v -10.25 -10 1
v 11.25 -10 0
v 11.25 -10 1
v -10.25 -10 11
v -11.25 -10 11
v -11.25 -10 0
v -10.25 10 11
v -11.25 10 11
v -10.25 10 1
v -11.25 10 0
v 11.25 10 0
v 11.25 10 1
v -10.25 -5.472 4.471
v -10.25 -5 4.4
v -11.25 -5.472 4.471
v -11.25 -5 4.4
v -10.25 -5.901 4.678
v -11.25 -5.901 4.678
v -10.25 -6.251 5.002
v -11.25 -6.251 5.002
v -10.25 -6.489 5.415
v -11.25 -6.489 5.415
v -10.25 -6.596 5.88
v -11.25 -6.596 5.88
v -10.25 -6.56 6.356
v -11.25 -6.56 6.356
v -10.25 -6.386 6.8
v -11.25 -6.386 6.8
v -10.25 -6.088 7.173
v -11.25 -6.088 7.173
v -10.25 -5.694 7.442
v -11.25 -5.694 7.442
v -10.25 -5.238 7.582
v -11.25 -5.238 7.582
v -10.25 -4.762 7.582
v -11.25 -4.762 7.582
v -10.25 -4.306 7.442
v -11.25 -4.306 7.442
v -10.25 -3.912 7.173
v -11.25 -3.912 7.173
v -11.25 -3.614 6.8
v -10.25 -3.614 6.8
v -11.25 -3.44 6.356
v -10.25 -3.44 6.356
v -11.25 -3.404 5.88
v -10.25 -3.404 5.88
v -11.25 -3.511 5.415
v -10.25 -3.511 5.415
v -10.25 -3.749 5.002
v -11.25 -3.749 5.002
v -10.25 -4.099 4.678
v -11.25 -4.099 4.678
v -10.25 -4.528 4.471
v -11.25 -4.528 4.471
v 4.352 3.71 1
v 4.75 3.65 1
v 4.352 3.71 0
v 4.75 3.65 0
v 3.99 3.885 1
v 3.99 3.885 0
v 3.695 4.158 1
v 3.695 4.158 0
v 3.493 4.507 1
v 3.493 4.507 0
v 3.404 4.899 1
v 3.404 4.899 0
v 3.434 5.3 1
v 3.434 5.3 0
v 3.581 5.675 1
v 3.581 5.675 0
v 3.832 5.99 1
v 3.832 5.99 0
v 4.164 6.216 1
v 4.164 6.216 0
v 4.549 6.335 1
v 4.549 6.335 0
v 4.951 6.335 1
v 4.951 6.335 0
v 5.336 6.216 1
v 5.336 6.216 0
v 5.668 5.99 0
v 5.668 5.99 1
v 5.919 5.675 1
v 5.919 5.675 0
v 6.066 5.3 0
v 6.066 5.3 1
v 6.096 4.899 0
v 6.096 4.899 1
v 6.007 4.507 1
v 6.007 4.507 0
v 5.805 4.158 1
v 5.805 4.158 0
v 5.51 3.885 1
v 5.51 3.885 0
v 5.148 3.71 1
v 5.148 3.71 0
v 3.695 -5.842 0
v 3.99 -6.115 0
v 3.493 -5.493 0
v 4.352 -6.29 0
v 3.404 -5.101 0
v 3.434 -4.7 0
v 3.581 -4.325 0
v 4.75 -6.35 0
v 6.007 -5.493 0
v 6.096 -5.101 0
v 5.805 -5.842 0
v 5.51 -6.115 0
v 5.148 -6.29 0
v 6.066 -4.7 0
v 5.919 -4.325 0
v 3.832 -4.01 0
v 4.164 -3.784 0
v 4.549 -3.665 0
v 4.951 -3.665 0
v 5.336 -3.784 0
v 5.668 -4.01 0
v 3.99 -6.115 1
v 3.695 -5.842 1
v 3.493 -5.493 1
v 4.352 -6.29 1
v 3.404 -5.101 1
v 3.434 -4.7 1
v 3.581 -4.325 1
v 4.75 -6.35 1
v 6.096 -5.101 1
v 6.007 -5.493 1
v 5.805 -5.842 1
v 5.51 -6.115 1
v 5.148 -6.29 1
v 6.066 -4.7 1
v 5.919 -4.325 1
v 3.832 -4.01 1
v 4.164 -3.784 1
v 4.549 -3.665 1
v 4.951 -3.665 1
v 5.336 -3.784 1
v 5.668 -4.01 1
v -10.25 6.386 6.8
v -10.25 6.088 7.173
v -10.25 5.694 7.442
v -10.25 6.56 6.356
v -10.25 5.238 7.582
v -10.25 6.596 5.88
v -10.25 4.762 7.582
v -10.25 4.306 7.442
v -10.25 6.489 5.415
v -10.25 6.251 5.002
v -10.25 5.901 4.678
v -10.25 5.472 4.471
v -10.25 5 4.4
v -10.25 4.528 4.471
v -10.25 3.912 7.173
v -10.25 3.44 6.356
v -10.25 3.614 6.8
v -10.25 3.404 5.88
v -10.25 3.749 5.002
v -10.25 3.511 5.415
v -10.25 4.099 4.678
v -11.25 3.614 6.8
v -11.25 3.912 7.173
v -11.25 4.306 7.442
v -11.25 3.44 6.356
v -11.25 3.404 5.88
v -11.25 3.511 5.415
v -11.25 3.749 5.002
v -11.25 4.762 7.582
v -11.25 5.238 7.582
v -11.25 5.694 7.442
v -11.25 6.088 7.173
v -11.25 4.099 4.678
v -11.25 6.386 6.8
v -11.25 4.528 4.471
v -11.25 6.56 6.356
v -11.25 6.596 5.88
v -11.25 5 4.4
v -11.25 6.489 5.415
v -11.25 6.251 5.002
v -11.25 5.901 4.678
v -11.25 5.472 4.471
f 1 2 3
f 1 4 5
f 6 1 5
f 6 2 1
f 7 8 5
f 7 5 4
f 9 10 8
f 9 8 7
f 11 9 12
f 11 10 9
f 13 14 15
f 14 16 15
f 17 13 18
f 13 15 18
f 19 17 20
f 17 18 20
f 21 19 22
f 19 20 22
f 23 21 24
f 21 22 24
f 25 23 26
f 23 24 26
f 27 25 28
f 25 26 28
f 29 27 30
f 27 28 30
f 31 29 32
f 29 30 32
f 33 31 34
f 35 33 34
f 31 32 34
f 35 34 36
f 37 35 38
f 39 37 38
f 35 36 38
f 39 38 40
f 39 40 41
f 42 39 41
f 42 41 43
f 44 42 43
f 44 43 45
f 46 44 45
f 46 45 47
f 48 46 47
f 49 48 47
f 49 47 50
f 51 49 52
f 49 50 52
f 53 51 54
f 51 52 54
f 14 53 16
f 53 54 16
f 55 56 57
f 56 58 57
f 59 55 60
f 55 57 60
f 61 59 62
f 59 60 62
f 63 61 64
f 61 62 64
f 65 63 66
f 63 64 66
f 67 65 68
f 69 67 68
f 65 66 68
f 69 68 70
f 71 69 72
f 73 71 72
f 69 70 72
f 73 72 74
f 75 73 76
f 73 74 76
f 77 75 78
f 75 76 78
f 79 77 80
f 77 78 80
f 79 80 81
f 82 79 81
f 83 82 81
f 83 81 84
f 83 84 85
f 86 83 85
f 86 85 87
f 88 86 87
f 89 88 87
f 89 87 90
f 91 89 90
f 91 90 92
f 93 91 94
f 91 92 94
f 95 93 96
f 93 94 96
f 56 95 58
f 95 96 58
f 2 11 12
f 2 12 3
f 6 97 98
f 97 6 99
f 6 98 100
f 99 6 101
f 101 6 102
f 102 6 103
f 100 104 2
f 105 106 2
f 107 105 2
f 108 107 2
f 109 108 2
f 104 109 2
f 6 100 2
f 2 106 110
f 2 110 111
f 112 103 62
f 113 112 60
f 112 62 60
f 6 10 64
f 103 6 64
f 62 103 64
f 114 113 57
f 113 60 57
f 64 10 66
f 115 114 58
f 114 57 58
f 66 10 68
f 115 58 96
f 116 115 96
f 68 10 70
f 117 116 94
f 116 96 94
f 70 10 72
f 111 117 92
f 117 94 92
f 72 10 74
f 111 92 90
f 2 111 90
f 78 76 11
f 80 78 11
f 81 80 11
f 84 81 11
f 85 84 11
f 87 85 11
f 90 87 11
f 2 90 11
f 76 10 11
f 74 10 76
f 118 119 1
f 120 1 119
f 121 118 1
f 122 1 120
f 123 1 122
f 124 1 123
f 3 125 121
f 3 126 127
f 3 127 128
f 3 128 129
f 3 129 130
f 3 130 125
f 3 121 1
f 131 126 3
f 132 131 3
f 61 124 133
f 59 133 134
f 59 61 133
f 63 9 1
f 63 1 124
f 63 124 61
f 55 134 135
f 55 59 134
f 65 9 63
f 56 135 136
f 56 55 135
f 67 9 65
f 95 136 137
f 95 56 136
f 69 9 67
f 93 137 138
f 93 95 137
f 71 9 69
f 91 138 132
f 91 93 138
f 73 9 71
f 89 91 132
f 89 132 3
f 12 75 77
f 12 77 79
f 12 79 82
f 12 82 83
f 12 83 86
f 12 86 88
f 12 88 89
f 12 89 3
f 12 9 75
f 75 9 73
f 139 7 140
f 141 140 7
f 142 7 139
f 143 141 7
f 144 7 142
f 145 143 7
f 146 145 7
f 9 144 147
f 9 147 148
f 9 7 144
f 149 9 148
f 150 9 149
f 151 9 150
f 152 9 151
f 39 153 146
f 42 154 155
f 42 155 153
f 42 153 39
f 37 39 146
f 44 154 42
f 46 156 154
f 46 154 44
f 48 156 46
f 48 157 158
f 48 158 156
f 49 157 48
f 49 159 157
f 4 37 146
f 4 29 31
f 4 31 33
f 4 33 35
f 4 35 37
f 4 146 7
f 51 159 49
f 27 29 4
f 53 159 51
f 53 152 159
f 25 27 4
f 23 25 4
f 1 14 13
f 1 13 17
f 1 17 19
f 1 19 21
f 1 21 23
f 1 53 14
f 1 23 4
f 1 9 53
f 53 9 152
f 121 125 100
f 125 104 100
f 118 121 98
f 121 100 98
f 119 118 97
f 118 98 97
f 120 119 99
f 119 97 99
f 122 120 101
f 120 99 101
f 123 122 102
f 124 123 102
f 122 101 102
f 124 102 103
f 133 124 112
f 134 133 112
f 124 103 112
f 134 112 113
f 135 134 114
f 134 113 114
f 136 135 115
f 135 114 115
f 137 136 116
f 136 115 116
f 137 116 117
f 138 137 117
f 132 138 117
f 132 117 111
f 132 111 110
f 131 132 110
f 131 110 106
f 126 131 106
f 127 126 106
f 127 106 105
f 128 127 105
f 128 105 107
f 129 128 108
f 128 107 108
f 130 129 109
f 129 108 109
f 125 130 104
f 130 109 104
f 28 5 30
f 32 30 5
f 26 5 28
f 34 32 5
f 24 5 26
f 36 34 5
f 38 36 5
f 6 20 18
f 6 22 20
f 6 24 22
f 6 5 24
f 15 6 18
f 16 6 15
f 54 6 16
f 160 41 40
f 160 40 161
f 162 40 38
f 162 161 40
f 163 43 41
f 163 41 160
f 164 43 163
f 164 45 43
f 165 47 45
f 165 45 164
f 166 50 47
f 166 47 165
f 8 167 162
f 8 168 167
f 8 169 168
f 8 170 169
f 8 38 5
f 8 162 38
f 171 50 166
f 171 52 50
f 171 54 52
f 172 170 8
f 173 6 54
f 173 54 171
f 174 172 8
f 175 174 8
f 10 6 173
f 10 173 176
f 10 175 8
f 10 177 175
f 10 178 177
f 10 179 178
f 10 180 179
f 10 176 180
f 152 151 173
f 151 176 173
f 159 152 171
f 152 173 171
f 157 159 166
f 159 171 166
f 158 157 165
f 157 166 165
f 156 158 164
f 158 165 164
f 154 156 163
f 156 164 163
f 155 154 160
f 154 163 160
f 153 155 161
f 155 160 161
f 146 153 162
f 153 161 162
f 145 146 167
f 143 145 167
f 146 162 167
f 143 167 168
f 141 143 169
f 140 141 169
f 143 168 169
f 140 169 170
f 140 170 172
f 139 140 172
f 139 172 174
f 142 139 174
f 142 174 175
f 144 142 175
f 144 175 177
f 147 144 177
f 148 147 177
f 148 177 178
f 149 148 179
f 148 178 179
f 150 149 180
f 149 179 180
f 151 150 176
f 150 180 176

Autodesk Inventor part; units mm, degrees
ref_plane "YZ Plane" through (0, 0, 0) normal (1, 0, 0) x (0, 1, 0)
ref_plane "XZ Plane" through (0, 0, 0) normal (0, 1, 0) x (-1, 0, 0)
ref_plane "XY Plane" through (0, 0, 0) normal (0, 0, 1) x (1, 0, 0)
sketch "スケッチ3" plane through (0, 0, 0) normal (0, 0, 1) x (1, 0, 0)
  line L0 (-11.25, 10) -> (11.25, 10)
  line L1 (11.25, 10) -> (11.25, -10)
  line L2 (11.25, -10) -> (-11.25, -10)
  line L3 (-11.25, -10) -> (-11.25, 10)
  line L4 (-11.25, 10) -> (11.25, -10) construction
  line L5 (11.25, 10) -> (-11.25, -10) construction
  point P0 (0, 0)
  dimension "d15" = 22.5
  dimension "d16" = 20
extrude "押し出し2" add sketch "スケッチ3" along normal blind 1
sketch "スケッチ4" plane through (0, 0, 1) normal (0, 0, 1) x (1, 0, 0)
  line L0 (-11.25, 10) -> (-11.25, -10) projected
  line L1 (11.25, 10) -> (-11.25, 10) projected
  line L2 (-11.25, -10) -> (11.25, -10) projected
  point P0 (0, 0)
  point P1 (4.75, 5)
  point P2 (4.75, -5)
  dimension "d19" = 16
  dimension "d20" = 5
  dimension "d21" = 5
hole "穴2" at (4.75, 5, 1) at (4.75, -5, 1) direction (0, 0, -1) diameter 2.7 end through all
sketch "スケッチ5" plane through (0, 0, 1) normal (0, 0, 1) x (1, 0, 0)
  line L0 (11.25, -10) -> (-11.25, -10) projected
  line L1 (-11.25, 10) -> (-10.25, 10)
  line L2 (-10.25, 10) -> (-10.25, -10)
  line L3 (-10.25, -10) -> (-11.25, -10)
  line L4 (-11.25, -10) -> (-11.25, 10)
  point P0 (0, 0)
  dimension "d29" = 1
extrude "押し出し3" add sketch "スケッチ5" along normal blind 10
sketch "スケッチ6" plane through (-10.25, -10, 1) normal (1, 0, 0) x (0, 0, -1)
  line L0 (-10, 0) -> (-10, 20) projected
  line L1 (0, 20) -> (-10, 20) projected
  line L2 (0, 0) -> (-10, 0) projected
  point P0 (1, 10)
  point P1 (-5, 15)
  point P2 (-5, 5)
  dimension "d32" = 5
  dimension "d33" = 5
  dimension "d34" = 5
hole "穴3" at (-10.25, 5, 6) at (-10.25, -5, 6) direction (-1, 0, 0) diameter 3.2 end through all
properties part number "爪_根本" material "アルミニウム 1100-H14"
